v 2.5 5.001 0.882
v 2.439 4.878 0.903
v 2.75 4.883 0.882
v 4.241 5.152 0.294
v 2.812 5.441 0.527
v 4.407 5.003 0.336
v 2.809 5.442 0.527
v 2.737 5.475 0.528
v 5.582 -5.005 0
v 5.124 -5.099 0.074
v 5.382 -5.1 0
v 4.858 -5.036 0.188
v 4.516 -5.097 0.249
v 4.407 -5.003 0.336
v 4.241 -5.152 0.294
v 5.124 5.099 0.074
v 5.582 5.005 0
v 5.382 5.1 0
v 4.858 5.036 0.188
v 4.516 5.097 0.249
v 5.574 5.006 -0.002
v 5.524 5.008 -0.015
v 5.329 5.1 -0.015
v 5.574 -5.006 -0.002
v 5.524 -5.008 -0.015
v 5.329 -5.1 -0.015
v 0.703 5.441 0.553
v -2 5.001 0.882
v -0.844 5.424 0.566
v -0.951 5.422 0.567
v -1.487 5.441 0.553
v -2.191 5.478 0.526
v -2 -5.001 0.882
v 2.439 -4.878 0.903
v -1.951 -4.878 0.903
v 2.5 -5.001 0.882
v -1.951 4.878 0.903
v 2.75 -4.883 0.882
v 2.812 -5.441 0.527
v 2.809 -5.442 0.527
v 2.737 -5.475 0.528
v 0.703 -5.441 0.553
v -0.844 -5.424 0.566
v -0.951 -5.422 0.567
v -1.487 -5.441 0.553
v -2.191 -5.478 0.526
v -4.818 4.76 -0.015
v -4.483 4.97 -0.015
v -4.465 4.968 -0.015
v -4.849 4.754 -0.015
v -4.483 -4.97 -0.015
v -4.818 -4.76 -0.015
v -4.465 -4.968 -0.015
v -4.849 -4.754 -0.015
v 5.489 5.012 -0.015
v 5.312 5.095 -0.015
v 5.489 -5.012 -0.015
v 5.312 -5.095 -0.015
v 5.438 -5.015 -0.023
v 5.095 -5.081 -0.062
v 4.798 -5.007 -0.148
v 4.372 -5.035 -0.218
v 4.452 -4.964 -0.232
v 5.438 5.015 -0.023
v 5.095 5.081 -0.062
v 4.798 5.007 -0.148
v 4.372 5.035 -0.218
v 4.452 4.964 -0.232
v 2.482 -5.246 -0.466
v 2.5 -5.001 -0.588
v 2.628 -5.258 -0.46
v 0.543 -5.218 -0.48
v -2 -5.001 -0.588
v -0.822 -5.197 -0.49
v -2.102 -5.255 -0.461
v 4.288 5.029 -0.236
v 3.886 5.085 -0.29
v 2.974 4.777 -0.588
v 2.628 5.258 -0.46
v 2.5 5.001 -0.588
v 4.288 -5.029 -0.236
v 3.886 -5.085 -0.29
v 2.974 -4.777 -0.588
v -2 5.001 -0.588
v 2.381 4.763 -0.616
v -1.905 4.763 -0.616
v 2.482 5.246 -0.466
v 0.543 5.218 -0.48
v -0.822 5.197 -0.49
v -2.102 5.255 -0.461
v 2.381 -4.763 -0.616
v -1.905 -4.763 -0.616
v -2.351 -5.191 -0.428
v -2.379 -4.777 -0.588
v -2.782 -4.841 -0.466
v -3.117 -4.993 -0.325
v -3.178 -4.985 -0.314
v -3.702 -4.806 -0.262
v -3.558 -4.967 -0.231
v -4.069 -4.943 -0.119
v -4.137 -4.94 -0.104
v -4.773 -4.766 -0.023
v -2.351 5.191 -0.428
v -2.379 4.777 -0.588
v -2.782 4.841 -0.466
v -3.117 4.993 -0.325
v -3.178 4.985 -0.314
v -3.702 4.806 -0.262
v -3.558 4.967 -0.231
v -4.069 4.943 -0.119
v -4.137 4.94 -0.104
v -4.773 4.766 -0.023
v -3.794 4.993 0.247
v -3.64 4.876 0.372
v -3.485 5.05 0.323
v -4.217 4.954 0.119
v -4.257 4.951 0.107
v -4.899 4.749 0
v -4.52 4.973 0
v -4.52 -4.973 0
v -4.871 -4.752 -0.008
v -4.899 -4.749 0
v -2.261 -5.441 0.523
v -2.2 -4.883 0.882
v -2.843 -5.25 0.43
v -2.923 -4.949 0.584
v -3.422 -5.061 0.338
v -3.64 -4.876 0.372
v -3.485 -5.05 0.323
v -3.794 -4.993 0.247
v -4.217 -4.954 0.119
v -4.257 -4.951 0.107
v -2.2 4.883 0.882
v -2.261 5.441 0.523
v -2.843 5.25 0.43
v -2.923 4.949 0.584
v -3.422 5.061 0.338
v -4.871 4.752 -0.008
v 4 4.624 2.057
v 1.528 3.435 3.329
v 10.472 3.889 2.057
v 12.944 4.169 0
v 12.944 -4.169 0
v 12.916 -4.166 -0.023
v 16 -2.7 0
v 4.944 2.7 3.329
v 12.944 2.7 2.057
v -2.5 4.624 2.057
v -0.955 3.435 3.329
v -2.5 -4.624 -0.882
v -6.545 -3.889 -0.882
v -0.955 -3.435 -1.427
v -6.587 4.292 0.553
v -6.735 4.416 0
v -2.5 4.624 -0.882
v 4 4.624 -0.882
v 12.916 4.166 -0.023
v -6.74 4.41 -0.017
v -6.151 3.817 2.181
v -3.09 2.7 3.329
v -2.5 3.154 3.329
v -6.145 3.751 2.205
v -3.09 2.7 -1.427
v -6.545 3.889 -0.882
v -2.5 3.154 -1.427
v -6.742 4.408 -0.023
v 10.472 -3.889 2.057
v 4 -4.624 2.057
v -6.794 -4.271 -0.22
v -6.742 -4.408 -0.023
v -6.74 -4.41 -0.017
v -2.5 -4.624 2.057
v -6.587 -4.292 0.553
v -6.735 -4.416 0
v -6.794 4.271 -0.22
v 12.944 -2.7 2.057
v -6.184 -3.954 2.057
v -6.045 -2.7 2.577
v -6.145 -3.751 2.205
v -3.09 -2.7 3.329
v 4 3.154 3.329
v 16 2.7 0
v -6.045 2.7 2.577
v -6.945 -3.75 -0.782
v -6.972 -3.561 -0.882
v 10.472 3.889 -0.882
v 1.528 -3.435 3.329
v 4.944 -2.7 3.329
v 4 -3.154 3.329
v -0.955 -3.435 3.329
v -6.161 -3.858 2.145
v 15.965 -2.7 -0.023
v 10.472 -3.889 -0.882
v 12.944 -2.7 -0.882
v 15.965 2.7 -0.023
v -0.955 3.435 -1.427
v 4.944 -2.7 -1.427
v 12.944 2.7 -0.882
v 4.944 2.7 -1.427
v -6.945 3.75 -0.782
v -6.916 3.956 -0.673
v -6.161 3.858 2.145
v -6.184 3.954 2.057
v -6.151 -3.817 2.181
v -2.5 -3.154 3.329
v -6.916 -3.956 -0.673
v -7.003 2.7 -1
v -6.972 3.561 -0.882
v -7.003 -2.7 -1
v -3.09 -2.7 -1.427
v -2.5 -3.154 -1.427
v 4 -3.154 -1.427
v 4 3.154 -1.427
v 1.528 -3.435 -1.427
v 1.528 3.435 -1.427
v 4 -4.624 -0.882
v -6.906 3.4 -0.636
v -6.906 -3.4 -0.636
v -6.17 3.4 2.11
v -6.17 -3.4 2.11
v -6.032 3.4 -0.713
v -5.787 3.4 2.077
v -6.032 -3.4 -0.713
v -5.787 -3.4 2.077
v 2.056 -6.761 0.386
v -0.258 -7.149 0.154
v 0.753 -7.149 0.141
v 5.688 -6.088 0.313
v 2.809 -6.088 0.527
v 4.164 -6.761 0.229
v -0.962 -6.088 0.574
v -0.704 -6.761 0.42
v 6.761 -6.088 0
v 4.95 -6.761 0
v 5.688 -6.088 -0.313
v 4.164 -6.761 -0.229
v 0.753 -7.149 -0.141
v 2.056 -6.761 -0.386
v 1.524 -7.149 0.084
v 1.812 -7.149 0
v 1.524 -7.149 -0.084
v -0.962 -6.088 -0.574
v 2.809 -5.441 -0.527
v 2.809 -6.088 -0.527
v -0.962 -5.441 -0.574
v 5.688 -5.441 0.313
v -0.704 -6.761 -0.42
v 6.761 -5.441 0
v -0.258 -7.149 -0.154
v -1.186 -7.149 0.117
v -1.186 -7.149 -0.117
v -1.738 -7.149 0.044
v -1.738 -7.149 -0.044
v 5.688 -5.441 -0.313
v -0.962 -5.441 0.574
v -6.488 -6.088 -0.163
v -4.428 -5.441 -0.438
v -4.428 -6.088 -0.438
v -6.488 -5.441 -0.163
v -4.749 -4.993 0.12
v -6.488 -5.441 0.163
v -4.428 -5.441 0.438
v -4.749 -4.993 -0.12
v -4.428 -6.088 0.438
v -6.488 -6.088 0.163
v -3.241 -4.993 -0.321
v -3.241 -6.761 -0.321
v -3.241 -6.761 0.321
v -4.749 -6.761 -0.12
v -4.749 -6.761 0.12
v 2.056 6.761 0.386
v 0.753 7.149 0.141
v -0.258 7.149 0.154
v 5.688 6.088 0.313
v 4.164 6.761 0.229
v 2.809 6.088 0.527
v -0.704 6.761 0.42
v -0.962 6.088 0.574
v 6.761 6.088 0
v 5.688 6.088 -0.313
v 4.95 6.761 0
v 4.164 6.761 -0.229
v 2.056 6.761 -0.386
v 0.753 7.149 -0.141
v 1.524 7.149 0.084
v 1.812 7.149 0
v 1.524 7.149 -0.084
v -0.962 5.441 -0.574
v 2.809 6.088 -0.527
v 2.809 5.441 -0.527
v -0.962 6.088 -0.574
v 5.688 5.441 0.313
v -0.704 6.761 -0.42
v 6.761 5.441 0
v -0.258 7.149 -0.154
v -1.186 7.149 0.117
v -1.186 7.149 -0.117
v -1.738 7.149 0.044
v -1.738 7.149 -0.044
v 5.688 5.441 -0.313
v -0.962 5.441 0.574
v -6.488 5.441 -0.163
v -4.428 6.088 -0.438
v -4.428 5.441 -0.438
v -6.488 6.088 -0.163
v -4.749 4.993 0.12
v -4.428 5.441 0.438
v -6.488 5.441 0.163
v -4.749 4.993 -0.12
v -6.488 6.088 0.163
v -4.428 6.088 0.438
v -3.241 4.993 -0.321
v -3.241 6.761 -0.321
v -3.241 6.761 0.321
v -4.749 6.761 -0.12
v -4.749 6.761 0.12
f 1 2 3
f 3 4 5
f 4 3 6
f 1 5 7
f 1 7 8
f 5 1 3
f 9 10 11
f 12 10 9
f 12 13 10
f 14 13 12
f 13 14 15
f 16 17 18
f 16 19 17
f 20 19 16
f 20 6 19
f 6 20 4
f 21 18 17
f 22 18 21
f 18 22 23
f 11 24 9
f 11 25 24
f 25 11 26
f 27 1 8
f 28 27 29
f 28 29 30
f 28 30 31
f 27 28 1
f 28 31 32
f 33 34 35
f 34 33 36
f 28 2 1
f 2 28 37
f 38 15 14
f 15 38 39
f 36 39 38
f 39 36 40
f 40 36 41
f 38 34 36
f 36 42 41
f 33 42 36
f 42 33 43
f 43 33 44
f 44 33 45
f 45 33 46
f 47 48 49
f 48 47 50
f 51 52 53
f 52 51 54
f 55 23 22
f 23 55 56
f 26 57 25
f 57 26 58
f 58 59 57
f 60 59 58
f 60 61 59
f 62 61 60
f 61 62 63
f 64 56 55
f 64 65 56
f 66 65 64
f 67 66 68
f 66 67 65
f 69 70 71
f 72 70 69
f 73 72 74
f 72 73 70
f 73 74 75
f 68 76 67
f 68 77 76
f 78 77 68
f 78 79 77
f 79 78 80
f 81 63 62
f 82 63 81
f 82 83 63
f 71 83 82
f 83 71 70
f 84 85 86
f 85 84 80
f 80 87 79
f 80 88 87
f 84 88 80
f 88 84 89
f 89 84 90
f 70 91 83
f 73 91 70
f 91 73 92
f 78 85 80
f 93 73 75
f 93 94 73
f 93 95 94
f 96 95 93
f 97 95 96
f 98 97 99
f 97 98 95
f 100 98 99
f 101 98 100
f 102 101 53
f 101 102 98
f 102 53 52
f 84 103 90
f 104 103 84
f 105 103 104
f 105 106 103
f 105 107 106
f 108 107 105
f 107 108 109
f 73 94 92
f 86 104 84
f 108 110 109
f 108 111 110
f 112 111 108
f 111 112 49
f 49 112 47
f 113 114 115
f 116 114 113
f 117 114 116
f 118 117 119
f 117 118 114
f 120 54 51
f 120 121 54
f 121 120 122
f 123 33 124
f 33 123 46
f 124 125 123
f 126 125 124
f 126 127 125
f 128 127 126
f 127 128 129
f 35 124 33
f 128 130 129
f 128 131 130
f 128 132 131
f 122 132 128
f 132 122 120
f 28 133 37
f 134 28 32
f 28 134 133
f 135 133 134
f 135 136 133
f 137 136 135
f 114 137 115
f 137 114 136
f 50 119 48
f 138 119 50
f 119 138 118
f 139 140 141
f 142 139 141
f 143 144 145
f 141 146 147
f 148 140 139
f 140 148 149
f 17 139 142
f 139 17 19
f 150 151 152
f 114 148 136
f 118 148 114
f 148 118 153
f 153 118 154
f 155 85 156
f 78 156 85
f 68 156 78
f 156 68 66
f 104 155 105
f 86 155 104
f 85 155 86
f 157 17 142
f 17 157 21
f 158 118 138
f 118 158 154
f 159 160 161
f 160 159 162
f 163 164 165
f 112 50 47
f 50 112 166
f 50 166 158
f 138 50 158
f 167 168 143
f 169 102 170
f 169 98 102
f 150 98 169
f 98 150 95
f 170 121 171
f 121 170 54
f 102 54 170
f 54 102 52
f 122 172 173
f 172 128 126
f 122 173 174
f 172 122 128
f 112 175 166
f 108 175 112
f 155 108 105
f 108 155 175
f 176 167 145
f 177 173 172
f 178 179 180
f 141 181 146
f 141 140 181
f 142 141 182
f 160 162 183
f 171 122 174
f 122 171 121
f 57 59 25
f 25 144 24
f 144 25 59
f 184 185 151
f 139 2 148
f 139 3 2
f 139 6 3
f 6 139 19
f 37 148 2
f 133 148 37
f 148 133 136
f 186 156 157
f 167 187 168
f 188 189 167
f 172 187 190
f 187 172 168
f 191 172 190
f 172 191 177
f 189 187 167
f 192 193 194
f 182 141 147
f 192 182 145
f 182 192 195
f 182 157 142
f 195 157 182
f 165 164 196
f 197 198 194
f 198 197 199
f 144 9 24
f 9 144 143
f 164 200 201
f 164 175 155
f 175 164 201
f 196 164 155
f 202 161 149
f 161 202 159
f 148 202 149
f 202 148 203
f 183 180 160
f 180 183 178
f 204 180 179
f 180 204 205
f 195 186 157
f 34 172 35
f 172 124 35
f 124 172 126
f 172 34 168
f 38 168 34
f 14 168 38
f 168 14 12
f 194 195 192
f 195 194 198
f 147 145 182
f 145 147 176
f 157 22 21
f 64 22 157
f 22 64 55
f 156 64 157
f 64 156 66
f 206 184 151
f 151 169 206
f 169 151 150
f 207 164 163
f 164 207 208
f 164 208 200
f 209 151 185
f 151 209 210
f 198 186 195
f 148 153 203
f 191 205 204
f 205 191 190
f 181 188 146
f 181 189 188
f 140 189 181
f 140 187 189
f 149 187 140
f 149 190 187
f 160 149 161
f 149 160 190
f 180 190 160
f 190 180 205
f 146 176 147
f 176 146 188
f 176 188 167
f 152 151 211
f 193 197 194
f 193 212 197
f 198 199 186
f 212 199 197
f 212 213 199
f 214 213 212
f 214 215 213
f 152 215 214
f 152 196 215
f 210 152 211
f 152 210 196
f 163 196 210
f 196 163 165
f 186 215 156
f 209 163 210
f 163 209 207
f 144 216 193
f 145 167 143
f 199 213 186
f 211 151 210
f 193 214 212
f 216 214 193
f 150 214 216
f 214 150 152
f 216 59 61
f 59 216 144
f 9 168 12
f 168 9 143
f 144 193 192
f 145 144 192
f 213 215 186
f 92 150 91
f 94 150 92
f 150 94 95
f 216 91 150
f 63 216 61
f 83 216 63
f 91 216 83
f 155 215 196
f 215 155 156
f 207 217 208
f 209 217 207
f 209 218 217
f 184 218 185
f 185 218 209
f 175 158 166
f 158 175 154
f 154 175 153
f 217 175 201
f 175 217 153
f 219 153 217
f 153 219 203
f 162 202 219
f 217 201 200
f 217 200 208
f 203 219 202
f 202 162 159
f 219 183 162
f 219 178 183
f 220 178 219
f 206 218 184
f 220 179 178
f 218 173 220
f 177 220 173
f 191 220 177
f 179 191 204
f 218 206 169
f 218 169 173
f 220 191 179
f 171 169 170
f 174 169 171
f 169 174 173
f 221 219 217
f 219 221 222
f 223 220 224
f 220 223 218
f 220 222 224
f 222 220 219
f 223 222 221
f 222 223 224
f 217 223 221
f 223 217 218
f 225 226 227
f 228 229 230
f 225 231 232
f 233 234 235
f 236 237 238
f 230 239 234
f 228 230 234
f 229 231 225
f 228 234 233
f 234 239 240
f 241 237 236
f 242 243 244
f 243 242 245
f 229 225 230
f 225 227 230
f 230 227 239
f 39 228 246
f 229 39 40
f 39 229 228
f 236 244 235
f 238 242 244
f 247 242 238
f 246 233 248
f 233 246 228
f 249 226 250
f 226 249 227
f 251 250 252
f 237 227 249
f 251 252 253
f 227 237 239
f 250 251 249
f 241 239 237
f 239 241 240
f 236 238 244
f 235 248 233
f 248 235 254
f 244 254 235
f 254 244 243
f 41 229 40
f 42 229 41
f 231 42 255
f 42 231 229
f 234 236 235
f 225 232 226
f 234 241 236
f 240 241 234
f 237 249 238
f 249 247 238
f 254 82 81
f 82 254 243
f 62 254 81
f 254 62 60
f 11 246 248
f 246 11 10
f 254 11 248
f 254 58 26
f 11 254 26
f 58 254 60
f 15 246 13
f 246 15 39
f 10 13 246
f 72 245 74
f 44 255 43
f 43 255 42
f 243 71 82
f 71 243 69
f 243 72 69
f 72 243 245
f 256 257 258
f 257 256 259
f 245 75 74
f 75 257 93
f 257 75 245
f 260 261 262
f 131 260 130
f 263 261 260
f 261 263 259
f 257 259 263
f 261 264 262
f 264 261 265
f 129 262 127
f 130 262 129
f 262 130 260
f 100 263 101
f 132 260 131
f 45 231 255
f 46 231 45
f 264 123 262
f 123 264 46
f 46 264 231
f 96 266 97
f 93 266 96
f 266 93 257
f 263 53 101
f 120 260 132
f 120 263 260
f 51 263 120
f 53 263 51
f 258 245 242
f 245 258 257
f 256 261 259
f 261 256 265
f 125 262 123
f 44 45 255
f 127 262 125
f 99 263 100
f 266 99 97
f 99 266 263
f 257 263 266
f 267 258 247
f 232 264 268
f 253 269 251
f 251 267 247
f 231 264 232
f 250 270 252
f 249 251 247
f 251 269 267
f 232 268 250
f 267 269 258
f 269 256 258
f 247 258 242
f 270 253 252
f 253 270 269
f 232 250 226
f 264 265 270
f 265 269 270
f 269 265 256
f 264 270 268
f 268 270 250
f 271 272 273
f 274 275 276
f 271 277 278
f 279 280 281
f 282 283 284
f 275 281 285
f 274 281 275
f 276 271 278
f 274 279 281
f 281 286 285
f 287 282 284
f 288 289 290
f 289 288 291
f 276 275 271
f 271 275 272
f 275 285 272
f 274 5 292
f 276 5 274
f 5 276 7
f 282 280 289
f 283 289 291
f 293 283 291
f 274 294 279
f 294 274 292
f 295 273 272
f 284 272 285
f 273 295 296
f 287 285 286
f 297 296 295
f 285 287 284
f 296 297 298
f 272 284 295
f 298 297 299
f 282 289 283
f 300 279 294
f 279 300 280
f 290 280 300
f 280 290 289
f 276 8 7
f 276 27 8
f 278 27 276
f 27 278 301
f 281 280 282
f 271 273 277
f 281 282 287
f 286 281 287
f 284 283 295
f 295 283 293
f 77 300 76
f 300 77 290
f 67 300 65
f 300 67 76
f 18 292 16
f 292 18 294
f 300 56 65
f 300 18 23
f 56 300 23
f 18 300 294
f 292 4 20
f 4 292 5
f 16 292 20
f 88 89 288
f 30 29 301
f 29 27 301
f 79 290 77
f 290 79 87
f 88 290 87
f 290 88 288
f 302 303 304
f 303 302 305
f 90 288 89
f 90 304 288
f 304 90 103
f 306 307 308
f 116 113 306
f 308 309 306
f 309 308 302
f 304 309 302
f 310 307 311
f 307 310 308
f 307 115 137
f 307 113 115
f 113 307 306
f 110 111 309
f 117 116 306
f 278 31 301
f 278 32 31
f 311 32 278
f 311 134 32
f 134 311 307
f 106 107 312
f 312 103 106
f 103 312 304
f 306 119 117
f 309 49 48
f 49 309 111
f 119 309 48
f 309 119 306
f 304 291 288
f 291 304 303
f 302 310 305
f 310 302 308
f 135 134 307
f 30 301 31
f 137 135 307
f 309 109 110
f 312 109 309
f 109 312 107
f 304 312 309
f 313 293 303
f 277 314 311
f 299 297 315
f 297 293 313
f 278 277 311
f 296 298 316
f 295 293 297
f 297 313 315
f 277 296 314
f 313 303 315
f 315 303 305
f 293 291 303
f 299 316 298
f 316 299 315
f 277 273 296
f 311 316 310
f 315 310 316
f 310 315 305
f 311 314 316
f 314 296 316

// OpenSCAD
// file: ../lib/util.scad
fn1 = 32;
fn2 = 16;

module util_half_sphere(radius, fn=fn1) {
    difference() {
        sphere(radius, $fn=fn);
        translate([0,0,-(radius+radius/19)])
            cube(2*radius+radius/10, center=true);
    }
}

function gcd(a,b) = a == b ? a : a > b ? gcd(a-b, b) : gcd(a, b-a);

module util_saucer(length, width, height, fn=fn1) {
    rad = gcd(length,gcd(width,height));
    //rad = 10;
    scale([length/(2*rad), width/(2*rad), height/rad])
        util_half_sphere(rad, fn);
}

module util_half_cylinder(length, radius, inner_fn=fn2, outer_fn=fn1) {
    maxval = max(length, 2*radius);
    intersection() {
        difference() {
            rotate([0,90,0])
                translate([0,0,-(length/2 + length/20)])
                    cylinder(length+length/10, radius, radius, $fn=inner_fn);
            
            translate([0,0,(maxval/2 + maxval/19)])
                cube(maxval+maxval/10, center=true);
        }
        
        translate([0,0,-(radius+radius/20)])
            cylinder(radius + radius/10, length/2, length/2, $fn=outer_fn);
    }
}

module util_body(length, width, height, upper_height, fn=fn1) {
    rad = gcd(length, gcd(width, upper_height));
    
    scale(.995) scale([length/(2*rad), width/(2*rad), 1])
        util_half_cylinder(2*rad, height, outer_fn=fn);
}

module util_graded_cylinder(height, radius_start, radius_end, grades=1, fn=fn1) {
    height_grade = height / grades;
    radius_grade = (radius_start - radius_end) / (grades * grades);
    for (i = [0 : 1 : grades]) {
        translate([0,0,i*height_grade])
            cylinder(height_grade, 
                     radius_start - i*radius_grade * i,
                     radius_start - (i+1) * radius_grade * (i+1),
                     $fn = fn);
    }
}

module util_nacelle(length, width, height, curved=false, up=true, front_bulge=false) {
    rad = min(width, height/2);
    grads = curved ? 6 : 1;
    scale_factor = front_bulge ? 1.1 : 1;
    direction = up ? -1 : 1;
    difference() {
        scale([1, width/ (2*rad), height/rad])
            difference() {
                union() {
                    rotate([0,-90,0])
                        rotate(30)
                            util_graded_cylinder(length-rad, rad, rad/2, grads, 6);
                    scale(scale_factor) 
                        rotate([0,90,0]) rotate(90) sphere(rad, $fn=6);
                }
                
                translate([-length/2, 0, direction * (height/2 + height/19)])
                    cube([length+length, width+width, height+height/10], center=true);
            }
        
        translate([-length-(curved?length/3:0), 0, -length/3])
            rotate([0,-45,0])
                cube(length, center=true);
    }
}

module util_mirrored(v) {
    children();
    mirror(v) children();
}

module util_ring(outer, inner, height) {
    difference() {
        translate([0,0,-height/2])
            cylinder(height, outer, outer);
        translate([0,0,-(height/2 + height/19)])
            cylinder(height+height/10, inner, inner);
    }
}

module util_star(radius, thick, num, half=false) {
    angle = 360/num;
    offset = half? angle/2 : 0;
    for (i = [0: 1: num]) {
        rotate(i* angle + offset)
            translate([radius/2,0,0])
                cube([radius, thick, thick], center=true);
    }
}

module util_ring_star(radius, thick, num, inner, half=false) {
    outer=inner+thick;
    avg = (inner + outer)/2;
    union() {
        difference() {
            util_star(radius, thick, num, half);
            cylinder(2*thick, outer, outer, $fn=num, center=true);
        }
        util_ring(outer, inner, thick);
    }
}

module util_hangar_disk(height, lower, upper, num, fn=fn1) {
    difference() {
            cylinder(height, lower, upper, $fn=fn, center=true);
        difference() {
            scale([1,1,22])
                util_star(1.1*upper, height/20, num, half=true);
            scale(.95)
                cylinder(height, lower, upper, $fn=fn, center=true);
        }
    }
}

module util_hangar_form(length, width, height, num, inner=0) {
    l = 0.6* max(length, width);
    h = 2.5* height;
    thick = min(height/20,1);
    inner = inner == 0 ? l/3 : inner;
    difference() {
        children();
        scale([1,1,h/thick]) 
            util_ring_star(l, thick, num, inner, half=true);
    }
    scale(.95) children();
}

module util_nacelle_bar(span, height, width, thickness) {
    rad = (span*span/(8*height) + height/2);
    outer = rad + thickness/2;
    inner = rad - thickness/2;
    difference(){
        translate([0,0,outer])
            rotate([0,90,0])
                util_ring(outer, inner, width);
    
        translate([0,0,1.1*outer+height])
            cube(2.2*outer, center=true);
    }
}

module util_q_sphere(rad, quadrant, faces) {
    x_sign = quadrant == 1 ? 1 :
             quadrant == 2 ? -1 :
             quadrant == 3 ? -1 :
             quadrant == 4 ? 1 : 0;
    z_sign = quadrant == 1 ? 1 :
             quadrant == 2 ? 1 :
             quadrant == 3 ? -1 :
             quadrant == 4 ? -1 : 0;
    
    difference() {
        sphere(rad, $fn=faces);

        translate([x_sign*(-1.1*rad - .01),0,0])
        cube(2.2*rad, center=true);

        translate([0,0,z_sign*(-1.1*rad - .01)])
        cube(2.2*rad, center=true);
    }
}

module util_ovoid(front_rad, back_rad, width, upper_rad, lower_rad, faces=32) {
    half_width = width/2;
    largest=max(front_rad, back_rad, half_width, upper_rad, lower_rad);
    smallest=min(front_rad, back_rad, half_width, upper_rad, lower_rad);
    
    union() {
        scale([front_rad/smallest, half_width/smallest, upper_rad/smallest])
        util_q_sphere(smallest, 1, faces);
        
        scale([front_rad/smallest, half_width/smallest, lower_rad/smallest])
        util_q_sphere(smallest, 4, faces);
        
        scale([back_rad/smallest, half_width/smallest, lower_rad/smallest])
        util_q_sphere(smallest, 3, faces);
        
        scale([back_rad/smallest, half_width/smallest, upper_rad/smallest])
        util_q_sphere(smallest, 2, faces);
    }
}
// main file
use <../lib/util.scad>;

module runabout() {
    difference() {
        union() {
            hull()
            util_mirrored([0,1,0])
            translate([0,2.7,0])
            util_ovoid(16,10,5,3.5,1.5, faces=10);
            
            util_ovoid(10,8,13,1.5,1,faces=10);
        }

        translate([-15/2-7,0,0])
        rotate([0,15,0])
        cube(15,center=true);
        
        translate([-15/2-.9,0,.9])
        rotate([0,5,0])
        cube([5,6.8,2.8], center=true);
    }
    
    util_mirrored([0,1,0])
    translate([0,-5.7,0])
    rotate([90,0,0])
    util_ovoid(7,7,1.2,1.5,1,faces=11);
}




runabout();
